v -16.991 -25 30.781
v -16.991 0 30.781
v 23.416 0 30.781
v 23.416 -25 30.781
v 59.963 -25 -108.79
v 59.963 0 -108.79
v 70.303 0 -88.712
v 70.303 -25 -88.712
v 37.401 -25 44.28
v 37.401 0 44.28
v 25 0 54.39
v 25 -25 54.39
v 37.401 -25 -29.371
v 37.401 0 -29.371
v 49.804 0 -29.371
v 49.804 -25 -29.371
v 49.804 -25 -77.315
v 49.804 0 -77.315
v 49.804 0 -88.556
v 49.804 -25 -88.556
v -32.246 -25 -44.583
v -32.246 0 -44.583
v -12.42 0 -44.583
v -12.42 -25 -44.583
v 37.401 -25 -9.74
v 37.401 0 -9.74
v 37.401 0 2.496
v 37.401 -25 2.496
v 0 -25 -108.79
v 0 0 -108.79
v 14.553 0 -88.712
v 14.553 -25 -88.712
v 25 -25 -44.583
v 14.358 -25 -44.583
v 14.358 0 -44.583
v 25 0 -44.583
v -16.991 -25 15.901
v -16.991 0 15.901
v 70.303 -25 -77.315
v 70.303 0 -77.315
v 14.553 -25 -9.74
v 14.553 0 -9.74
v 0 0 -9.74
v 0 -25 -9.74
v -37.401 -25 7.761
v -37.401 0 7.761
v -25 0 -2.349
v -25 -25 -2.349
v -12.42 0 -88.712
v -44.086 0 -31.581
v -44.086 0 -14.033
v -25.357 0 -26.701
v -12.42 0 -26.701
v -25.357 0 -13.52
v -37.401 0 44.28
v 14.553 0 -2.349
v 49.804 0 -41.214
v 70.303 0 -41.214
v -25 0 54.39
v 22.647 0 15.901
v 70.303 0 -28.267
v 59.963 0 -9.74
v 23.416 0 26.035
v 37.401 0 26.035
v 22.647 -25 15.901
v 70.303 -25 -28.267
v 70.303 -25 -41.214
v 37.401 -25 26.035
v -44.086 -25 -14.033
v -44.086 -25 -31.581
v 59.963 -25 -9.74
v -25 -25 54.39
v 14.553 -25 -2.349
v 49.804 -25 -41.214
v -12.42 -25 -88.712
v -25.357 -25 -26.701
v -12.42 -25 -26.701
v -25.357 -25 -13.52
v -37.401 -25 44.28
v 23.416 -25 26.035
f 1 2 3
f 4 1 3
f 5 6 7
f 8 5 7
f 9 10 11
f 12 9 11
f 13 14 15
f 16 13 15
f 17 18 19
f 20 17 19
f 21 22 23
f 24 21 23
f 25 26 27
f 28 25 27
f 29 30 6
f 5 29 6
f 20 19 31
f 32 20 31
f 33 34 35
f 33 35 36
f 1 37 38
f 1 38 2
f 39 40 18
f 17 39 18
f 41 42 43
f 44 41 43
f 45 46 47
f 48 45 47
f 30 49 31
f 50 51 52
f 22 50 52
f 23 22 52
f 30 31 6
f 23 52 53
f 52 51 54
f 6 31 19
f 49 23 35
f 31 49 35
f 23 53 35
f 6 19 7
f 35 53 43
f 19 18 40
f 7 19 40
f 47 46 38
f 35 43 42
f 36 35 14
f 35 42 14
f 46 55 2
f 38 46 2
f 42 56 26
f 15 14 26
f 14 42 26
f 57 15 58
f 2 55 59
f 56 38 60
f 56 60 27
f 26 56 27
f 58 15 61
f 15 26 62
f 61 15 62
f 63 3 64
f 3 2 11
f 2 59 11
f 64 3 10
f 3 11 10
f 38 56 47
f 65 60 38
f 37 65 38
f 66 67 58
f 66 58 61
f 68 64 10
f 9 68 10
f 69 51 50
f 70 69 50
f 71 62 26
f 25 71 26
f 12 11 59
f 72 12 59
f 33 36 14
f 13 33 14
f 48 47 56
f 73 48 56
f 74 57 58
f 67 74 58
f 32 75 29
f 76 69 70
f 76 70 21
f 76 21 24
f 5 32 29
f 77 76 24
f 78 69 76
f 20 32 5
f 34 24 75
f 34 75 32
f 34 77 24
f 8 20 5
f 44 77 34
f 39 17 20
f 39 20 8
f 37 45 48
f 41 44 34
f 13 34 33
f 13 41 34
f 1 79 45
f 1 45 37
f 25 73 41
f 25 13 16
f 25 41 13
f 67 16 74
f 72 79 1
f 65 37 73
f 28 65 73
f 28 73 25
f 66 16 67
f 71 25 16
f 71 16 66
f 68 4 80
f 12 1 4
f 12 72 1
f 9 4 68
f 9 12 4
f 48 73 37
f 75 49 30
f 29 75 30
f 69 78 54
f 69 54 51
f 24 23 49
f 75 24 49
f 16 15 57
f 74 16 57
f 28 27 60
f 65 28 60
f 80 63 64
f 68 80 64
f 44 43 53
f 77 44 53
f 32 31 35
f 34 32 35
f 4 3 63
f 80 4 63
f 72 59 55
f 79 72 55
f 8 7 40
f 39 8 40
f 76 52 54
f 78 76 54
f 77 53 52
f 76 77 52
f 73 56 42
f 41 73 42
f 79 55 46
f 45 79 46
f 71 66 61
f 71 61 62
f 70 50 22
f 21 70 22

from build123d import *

# Parameters (mm, degrees)
F1_DEPTH = 25


with BuildPart() as f1:
    # F0 (on Front) → F1 (new body)
    with BuildSketch(Plane.XZ):
        Polygon((25, 54.390011), (-25, 54.390011), (-37.401415, 44.280367), (-37.401415, 7.760552), (-25, -2.349091), (14.553074, -2.349091), (14.553074, -9.739744), (37.401415, -9.739744), (37.401415, 2.495785), (22.646608, 15.901208), (-16.990989, 15.901208), (-16.990989, 30.78134), (23.416273, 30.78134), (23.416273, 26.035091), (37.401415, 26.035091), (37.401415, 44.280367), align=None)
        Polygon((37.401415, -9.739744), (14.553074, -9.739744), (14.553074, -26.700841), (-12.420272, -26.700841), (-25.357073, -26.700841), (-25.357073, -13.520215), (-44.085521, -14.033324), (-44.085521, -31.581496), (-32.246049, -44.583419), (-12.420272, -44.583419), (14.358093, -44.583419), (25, -44.583419), (37.401415, -29.370707), align=None)
        Polygon((14.553074, -26.700841), (14.553074, -9.739744), (0, -9.739744), (-12.420272, -26.700841), align=None)
        Polygon((59.962764, -9.739744), (37.401415, -9.739744), (37.401415, -29.370707), (49.803725, -29.370707), (49.803725, -41.213728), (70.303194, -41.213728), (70.303194, -28.267196), align=None)
        Polygon((14.553074, -88.711776), (14.358093, -44.583419), (-12.420272, -44.583419), (-12.420272, -88.711776), (0, -108.790196), (59.962764, -108.790196), (70.303194, -88.711776), (70.303194, -77.314541), (49.803725, -77.314541), (49.803725, -88.556021), align=None)
    extrude(amount=F1_DEPTH)


solid = f1.part
